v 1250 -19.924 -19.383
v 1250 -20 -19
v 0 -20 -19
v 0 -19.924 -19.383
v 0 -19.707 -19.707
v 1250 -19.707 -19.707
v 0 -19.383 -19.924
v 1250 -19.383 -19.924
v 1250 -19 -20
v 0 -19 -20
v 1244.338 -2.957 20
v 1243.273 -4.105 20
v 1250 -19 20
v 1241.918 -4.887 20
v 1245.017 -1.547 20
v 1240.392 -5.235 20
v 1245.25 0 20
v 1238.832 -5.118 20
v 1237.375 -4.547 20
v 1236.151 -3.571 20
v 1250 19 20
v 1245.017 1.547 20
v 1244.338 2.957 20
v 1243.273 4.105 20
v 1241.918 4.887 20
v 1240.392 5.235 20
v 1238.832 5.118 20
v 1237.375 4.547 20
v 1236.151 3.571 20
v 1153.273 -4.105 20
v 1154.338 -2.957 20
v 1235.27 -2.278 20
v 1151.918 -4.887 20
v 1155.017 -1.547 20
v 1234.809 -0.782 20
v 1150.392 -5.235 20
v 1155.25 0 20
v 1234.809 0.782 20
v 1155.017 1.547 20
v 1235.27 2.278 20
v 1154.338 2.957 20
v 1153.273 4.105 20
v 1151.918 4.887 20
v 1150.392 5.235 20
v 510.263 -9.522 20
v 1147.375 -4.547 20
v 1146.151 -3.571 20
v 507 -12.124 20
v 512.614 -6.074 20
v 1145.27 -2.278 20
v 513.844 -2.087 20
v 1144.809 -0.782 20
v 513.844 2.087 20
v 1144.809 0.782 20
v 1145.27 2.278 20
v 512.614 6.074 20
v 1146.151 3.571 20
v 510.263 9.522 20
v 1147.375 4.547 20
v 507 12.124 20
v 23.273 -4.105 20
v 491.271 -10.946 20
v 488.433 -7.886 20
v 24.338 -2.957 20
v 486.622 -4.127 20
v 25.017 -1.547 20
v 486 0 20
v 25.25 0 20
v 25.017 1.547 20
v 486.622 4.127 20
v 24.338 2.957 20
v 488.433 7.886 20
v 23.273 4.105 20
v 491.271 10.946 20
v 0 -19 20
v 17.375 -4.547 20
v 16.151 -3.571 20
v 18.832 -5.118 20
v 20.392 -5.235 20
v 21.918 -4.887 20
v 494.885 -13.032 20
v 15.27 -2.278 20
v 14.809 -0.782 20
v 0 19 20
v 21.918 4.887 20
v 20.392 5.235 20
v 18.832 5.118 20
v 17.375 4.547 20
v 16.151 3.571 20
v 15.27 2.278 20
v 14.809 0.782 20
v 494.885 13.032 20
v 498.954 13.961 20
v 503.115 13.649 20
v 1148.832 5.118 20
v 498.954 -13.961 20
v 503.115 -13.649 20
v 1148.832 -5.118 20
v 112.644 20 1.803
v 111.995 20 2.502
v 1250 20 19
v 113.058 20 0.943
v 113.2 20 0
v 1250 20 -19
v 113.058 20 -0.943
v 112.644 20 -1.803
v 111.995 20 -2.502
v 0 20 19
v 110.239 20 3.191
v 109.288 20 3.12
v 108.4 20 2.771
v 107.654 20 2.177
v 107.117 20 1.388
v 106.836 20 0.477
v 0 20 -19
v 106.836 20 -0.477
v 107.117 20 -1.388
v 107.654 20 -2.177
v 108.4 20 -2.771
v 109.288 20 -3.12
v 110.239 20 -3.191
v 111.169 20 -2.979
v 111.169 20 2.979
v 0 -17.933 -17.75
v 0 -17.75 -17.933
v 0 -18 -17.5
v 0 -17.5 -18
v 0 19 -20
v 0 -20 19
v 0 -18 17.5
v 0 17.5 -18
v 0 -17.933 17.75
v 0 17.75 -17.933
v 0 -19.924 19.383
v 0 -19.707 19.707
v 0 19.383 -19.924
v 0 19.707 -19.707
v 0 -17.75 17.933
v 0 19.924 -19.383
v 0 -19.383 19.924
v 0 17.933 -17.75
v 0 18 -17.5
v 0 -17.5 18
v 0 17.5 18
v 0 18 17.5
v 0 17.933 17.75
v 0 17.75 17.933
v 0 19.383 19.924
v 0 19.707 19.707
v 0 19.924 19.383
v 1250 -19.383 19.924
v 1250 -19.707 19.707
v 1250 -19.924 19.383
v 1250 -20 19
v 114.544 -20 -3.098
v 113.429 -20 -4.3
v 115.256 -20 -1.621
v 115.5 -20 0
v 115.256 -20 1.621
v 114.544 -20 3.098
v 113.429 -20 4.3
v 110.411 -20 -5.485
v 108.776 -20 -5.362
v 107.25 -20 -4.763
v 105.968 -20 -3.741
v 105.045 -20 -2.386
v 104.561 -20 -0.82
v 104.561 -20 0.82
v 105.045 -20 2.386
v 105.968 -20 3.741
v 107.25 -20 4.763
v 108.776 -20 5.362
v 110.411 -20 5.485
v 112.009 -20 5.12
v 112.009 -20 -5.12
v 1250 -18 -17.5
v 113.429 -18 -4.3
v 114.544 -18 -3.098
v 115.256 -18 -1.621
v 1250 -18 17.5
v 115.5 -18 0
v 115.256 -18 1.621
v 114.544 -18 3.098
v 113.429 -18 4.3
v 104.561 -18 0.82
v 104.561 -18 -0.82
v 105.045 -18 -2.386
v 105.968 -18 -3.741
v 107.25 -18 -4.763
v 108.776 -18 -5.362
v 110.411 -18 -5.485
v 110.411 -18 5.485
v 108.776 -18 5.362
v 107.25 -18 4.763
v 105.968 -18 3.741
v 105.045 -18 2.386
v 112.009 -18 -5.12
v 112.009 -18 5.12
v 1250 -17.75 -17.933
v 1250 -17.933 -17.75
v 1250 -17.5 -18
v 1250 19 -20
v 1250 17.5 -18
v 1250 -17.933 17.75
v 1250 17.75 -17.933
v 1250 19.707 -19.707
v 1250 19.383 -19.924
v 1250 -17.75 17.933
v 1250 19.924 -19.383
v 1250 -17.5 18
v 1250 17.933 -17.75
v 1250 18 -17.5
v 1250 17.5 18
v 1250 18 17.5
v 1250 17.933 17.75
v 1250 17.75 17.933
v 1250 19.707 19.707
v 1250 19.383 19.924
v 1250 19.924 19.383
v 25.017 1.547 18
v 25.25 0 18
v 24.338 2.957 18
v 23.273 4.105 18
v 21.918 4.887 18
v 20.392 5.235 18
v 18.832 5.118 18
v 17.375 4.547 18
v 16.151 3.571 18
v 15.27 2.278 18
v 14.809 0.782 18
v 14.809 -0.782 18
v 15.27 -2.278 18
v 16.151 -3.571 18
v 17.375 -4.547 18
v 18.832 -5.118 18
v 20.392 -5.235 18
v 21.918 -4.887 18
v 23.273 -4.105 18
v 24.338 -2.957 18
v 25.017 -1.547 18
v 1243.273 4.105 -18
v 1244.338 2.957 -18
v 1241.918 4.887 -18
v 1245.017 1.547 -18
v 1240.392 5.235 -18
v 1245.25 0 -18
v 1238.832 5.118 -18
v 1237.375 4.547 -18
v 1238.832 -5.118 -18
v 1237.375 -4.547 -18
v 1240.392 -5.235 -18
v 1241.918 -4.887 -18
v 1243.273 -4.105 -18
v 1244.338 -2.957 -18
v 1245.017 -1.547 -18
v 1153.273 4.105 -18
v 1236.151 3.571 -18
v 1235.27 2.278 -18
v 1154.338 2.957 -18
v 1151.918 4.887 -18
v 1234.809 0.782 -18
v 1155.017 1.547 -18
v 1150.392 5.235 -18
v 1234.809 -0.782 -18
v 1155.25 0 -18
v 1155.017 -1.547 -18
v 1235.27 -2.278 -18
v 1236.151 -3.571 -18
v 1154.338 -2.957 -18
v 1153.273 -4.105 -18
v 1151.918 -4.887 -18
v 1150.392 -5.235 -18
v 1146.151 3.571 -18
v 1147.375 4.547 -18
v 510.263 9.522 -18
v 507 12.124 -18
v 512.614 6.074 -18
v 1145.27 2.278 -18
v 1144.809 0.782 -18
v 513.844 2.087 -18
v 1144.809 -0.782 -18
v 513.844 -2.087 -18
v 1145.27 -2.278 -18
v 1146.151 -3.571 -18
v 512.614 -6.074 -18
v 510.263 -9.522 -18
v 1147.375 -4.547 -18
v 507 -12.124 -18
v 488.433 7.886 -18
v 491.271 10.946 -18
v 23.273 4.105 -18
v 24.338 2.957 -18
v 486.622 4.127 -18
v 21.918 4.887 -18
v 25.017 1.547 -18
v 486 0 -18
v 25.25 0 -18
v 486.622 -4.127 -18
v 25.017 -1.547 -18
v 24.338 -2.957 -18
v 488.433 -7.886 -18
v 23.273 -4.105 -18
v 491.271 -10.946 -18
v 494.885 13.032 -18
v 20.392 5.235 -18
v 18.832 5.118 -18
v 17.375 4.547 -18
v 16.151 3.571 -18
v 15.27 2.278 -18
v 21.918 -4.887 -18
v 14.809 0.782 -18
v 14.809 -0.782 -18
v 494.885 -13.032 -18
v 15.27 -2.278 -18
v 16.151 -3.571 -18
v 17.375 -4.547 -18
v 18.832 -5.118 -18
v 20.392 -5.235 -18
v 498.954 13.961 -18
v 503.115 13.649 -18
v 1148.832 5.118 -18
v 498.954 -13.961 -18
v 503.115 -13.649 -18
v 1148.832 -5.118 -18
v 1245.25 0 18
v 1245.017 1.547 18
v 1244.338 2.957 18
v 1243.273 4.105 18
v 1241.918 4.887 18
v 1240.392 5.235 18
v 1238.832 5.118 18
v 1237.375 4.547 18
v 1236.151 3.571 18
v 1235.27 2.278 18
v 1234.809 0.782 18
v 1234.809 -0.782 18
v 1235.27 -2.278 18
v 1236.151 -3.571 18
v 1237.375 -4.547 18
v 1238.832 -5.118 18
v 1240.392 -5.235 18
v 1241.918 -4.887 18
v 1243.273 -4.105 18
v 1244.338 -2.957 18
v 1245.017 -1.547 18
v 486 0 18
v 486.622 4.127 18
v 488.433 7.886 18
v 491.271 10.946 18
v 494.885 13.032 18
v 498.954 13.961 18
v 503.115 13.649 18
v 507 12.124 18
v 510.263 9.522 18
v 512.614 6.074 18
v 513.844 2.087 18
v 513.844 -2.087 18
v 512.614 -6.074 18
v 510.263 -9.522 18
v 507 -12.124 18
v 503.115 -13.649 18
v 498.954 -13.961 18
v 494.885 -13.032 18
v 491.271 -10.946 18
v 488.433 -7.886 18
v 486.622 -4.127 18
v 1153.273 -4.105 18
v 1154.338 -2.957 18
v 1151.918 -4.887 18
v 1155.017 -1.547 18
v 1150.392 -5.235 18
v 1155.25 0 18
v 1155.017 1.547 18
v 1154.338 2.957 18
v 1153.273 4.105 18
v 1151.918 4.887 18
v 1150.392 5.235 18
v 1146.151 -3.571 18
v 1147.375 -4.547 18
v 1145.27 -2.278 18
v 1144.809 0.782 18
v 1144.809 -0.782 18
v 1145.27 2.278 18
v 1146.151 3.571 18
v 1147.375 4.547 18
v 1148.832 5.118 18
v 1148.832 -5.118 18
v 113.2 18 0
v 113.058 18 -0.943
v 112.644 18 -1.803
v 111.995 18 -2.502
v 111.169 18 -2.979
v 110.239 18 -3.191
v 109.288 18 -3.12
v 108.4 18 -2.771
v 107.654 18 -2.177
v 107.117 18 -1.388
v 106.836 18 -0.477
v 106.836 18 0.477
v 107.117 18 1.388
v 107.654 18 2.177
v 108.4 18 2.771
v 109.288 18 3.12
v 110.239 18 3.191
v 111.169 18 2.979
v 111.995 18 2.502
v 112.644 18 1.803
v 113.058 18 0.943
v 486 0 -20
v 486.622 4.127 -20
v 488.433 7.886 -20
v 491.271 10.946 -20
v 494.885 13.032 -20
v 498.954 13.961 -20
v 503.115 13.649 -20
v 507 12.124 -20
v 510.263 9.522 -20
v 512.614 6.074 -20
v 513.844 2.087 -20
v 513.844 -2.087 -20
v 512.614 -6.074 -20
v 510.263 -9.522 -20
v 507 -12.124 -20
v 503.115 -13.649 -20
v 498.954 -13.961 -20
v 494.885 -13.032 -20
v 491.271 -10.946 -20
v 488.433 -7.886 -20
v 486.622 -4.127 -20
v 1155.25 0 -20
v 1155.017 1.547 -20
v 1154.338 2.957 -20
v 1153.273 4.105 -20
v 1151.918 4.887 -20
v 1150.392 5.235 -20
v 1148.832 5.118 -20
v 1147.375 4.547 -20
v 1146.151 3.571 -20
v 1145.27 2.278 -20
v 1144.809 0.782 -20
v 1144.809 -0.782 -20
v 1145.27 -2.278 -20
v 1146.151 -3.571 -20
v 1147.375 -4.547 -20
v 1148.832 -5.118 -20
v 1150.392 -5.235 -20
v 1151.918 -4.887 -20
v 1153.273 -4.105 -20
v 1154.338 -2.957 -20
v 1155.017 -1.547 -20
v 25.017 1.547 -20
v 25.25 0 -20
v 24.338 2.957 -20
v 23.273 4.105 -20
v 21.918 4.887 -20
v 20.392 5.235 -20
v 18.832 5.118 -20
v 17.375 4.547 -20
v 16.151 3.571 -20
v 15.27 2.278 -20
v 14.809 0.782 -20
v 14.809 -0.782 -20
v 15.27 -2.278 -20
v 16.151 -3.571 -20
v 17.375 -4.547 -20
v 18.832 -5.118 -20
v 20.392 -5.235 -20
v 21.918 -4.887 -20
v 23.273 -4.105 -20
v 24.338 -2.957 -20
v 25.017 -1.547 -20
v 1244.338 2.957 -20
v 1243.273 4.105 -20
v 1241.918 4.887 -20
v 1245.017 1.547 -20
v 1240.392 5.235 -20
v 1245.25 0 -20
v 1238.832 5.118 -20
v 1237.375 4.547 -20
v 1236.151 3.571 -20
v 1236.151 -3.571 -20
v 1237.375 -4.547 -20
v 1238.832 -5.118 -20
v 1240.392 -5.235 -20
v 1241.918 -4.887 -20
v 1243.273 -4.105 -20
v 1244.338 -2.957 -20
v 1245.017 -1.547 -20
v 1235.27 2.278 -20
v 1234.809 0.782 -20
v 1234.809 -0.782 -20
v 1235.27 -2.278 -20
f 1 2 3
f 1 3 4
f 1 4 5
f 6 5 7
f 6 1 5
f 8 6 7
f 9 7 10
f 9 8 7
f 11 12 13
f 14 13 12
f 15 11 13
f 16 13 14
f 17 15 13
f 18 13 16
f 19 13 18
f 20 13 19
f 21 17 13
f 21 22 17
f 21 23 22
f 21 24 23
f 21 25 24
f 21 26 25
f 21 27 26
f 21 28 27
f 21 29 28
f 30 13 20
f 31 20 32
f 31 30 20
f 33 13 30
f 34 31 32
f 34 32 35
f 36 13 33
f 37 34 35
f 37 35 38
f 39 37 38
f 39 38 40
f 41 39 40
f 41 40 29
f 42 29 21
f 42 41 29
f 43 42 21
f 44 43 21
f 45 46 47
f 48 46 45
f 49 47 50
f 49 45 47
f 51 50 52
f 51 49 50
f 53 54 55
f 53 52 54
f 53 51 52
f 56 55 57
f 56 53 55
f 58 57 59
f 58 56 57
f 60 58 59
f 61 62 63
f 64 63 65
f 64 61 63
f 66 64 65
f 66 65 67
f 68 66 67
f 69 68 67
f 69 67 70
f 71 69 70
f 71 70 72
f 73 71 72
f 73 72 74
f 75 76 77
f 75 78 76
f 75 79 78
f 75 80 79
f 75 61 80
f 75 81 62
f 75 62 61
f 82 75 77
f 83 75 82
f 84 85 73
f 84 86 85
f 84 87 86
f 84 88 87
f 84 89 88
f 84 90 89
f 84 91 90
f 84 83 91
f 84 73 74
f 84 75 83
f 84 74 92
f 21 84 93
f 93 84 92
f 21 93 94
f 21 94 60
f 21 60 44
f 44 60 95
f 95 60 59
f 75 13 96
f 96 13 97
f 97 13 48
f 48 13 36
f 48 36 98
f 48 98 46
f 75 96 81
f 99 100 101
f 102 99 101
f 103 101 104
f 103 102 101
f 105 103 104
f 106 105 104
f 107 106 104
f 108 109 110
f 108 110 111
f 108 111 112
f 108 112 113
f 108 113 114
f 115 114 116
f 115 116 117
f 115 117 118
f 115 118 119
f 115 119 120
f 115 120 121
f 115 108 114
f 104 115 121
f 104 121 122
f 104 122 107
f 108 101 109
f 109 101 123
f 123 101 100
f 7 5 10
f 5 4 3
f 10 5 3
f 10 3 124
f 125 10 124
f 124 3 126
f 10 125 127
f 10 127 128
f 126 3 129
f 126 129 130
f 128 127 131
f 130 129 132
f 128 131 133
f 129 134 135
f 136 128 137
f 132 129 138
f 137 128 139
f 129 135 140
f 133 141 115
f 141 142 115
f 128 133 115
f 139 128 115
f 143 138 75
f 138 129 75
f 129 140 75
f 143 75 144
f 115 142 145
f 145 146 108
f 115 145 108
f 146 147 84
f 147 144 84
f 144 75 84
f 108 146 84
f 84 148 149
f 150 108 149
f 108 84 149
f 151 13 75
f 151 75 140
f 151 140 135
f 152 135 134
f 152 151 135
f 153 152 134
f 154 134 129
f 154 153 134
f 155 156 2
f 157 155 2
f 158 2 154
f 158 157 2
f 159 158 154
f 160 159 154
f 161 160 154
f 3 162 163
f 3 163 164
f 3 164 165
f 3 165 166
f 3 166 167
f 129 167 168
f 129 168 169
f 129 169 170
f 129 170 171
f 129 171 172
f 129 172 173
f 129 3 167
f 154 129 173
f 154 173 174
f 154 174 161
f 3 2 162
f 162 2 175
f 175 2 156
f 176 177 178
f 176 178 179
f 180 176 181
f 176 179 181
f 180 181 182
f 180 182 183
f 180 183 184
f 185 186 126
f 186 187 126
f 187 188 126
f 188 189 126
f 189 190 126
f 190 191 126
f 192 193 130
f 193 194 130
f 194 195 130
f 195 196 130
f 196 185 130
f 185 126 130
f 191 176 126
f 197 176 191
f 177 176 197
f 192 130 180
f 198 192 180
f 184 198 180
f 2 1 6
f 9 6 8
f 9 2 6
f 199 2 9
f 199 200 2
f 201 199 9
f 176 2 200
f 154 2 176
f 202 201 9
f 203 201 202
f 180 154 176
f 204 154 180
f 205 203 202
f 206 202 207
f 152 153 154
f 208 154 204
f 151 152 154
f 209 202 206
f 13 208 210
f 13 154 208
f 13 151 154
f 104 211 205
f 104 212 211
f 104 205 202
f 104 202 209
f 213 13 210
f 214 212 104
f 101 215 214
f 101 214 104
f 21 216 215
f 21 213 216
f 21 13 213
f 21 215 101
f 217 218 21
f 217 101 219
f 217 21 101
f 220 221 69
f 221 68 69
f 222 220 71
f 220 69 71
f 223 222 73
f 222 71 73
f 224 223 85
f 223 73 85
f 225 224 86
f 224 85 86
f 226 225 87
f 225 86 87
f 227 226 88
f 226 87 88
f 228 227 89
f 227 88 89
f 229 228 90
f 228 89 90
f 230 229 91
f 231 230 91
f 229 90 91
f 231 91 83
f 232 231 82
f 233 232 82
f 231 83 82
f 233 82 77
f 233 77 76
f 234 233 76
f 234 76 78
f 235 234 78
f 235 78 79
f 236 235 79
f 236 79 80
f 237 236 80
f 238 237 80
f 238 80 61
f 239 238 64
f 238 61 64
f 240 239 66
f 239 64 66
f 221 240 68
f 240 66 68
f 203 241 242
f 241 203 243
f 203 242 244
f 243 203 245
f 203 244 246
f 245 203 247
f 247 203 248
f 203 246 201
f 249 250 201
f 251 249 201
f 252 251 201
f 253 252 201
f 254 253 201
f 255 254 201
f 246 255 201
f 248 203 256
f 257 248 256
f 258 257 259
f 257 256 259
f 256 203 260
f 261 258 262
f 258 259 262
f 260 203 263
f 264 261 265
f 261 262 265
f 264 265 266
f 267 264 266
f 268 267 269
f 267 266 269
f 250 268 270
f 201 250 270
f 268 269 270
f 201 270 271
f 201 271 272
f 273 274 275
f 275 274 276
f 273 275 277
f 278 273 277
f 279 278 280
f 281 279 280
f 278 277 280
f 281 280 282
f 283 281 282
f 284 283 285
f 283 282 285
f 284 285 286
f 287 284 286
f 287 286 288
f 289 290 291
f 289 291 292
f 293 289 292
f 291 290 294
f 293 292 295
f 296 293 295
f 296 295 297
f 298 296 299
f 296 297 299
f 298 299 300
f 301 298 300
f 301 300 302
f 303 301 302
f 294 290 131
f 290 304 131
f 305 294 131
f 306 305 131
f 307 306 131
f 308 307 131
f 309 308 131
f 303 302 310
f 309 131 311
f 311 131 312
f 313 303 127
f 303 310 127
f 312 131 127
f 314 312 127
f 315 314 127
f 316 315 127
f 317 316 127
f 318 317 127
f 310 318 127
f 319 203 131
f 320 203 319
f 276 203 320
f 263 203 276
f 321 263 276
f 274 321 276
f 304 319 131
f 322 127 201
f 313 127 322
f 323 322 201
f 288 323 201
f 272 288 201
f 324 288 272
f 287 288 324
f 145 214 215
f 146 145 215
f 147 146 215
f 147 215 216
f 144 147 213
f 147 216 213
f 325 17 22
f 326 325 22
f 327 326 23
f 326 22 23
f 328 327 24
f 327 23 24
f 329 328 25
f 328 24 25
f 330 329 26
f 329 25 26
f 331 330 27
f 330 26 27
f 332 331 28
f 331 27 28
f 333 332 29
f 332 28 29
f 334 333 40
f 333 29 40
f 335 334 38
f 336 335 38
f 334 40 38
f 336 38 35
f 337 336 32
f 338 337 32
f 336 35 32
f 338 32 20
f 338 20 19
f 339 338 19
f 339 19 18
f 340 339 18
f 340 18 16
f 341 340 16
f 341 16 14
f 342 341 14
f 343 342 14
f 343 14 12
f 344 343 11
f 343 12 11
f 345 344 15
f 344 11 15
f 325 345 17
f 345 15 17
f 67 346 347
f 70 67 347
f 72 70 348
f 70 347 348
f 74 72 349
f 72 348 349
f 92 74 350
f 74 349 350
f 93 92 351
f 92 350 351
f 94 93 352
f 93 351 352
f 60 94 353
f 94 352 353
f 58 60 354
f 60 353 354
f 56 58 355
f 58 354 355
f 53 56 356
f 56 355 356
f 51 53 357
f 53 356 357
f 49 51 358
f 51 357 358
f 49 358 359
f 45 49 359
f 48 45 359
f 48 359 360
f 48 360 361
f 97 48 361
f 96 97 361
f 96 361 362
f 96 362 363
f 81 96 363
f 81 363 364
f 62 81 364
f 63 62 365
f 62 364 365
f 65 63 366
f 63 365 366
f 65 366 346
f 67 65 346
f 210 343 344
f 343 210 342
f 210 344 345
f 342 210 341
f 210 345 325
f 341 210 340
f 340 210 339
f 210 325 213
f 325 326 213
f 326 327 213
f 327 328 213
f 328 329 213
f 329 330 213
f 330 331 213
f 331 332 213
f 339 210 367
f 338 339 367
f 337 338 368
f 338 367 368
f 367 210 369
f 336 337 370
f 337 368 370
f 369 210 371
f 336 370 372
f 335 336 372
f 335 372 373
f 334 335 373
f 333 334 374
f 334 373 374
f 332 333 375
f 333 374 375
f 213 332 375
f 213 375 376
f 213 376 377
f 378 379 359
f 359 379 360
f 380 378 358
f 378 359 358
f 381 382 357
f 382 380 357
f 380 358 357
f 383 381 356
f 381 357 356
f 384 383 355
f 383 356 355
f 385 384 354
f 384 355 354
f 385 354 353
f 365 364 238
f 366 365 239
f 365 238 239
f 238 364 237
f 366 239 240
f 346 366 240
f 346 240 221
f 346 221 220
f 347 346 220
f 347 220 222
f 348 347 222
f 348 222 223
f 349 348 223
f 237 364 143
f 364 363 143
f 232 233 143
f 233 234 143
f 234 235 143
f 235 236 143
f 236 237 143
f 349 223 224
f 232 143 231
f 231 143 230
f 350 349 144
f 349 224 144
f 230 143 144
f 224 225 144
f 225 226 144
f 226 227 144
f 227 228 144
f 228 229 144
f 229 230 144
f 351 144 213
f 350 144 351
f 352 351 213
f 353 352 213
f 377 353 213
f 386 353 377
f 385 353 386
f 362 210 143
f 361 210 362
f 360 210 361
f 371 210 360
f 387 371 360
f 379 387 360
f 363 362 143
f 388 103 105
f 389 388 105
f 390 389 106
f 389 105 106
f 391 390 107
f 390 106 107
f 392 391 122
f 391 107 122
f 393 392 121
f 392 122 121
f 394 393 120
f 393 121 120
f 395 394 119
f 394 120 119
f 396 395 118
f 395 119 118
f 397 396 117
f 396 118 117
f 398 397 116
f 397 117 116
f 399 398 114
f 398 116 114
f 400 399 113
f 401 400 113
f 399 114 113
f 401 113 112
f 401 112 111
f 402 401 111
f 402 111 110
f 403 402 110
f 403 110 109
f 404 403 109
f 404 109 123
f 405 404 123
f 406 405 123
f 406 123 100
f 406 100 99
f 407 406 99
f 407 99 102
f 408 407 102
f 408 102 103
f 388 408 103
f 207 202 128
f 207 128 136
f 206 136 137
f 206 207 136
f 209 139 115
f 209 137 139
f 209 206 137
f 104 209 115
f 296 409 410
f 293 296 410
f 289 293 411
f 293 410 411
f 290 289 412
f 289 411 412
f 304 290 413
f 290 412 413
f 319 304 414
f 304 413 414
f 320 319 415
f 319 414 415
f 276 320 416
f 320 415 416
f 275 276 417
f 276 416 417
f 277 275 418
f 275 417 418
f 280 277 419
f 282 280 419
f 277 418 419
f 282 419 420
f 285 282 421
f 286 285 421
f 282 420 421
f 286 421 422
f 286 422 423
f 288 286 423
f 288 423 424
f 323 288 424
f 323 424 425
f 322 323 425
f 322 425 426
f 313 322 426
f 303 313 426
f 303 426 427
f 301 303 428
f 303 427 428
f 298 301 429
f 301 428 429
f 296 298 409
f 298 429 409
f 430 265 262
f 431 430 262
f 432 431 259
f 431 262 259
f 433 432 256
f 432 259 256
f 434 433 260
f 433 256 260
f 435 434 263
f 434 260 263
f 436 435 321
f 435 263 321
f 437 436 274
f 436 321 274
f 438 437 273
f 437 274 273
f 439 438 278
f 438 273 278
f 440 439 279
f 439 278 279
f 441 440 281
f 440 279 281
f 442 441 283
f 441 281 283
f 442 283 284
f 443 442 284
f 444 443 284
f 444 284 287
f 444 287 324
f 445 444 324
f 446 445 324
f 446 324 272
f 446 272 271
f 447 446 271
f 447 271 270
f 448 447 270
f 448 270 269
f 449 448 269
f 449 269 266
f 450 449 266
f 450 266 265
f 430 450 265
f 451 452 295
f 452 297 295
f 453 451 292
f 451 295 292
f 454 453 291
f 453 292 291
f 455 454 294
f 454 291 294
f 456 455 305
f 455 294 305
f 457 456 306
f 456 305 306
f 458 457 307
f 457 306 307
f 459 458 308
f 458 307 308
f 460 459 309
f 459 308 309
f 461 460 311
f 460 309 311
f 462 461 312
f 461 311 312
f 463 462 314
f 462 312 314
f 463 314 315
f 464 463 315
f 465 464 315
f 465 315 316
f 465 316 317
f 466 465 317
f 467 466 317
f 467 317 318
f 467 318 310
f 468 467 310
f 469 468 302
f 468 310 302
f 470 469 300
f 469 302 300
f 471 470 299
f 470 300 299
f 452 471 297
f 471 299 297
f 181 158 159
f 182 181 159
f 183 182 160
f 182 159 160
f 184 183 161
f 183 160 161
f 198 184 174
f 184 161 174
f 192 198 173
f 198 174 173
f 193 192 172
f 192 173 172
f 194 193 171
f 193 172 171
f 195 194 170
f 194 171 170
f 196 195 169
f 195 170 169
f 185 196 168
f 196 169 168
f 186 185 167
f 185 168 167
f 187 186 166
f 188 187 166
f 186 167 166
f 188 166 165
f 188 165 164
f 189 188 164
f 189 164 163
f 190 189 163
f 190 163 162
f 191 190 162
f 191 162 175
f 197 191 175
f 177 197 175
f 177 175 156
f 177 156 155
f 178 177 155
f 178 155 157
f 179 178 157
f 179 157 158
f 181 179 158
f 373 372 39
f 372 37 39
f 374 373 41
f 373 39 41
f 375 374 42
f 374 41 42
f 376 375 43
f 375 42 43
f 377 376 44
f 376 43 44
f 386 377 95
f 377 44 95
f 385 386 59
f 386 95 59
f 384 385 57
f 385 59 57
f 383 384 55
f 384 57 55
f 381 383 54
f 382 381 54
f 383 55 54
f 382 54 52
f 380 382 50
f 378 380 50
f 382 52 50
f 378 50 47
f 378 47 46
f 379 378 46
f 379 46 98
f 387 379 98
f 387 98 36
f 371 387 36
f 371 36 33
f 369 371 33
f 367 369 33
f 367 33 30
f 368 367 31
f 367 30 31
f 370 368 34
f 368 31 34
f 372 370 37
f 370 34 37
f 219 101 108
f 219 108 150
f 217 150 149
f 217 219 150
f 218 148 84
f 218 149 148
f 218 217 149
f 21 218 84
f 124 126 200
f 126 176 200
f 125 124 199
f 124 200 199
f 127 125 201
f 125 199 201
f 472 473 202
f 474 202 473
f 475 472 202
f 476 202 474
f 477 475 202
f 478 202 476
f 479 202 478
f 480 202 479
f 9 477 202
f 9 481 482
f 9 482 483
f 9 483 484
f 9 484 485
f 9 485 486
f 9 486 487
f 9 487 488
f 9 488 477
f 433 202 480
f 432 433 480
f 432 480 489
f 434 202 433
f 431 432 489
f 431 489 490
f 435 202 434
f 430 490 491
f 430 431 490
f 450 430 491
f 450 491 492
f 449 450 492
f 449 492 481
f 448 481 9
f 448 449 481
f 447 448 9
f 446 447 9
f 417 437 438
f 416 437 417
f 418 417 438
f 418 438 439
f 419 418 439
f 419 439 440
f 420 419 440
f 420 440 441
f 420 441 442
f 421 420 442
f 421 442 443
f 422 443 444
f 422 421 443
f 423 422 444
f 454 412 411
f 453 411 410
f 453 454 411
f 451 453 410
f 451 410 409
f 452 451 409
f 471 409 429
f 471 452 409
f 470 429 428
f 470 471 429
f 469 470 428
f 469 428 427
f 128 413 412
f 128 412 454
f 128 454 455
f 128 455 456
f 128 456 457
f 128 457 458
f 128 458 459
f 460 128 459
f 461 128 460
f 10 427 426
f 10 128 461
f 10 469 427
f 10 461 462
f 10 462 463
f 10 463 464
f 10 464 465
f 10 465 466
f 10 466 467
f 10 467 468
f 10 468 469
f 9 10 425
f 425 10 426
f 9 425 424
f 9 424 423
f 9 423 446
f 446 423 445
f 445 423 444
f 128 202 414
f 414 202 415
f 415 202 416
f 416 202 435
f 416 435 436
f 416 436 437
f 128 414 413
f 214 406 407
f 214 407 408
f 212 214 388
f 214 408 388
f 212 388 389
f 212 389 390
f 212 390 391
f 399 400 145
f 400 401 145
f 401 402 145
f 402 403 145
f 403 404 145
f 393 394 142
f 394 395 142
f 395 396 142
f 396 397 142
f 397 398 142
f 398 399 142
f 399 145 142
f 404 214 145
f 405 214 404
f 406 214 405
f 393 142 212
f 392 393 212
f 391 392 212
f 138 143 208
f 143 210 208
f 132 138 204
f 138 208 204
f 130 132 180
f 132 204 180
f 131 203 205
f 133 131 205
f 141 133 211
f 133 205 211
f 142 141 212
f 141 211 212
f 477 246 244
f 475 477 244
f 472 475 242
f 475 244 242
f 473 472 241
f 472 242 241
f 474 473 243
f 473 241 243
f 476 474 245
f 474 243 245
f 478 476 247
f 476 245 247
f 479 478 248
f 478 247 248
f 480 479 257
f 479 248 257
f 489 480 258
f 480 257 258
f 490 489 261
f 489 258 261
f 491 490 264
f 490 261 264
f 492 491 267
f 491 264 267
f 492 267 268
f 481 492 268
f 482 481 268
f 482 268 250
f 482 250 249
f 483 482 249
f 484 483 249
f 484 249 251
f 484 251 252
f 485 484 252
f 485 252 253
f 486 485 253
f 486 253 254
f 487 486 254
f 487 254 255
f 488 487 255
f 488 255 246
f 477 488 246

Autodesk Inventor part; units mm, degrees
ref_plane "YZ Plane" through (0, 0, 0) normal (1, 0, 0) x (0, 1, 0)
ref_plane "XZ Plane" through (0, 0, 0) normal (0, 1, 0) x (-1, 0, 0)
ref_plane "XY Plane" through (0, 0, 0) normal (0, 0, 1) x (1, 0, 0)
sketch "Skizze1" plane through (0, 0, 0) normal (1, 0, 0) x (0, 1, 0)
  line L0 (-20, 20) -> (20, 20)
  line L1 (20, 20) -> (20, -20)
  line L2 (20, -20) -> (-20, -20)
  line L3 (-20, -20) -> (-20, 20)
  line L4 (-20, 20) -> (20, -20) construction
  line L5 (20, 20) -> (-20, -20) construction
  line L6 (-18, 18) -> (18, 18)
  line L7 (18, 18) -> (18, -18)
  line L8 (18, -18) -> (-18, -18)
  line L9 (-18, -18) -> (-18, 18)
  line L10 (-18, 18) -> (18, -18) construction
  line L11 (18, 18) -> (-18, -18) construction
  point P0 (0, 0)
  dimension "d0" = 40
  dimension "d1" = 40
  dimension "d2" = 36
  dimension "d3" = 36
extrude "Extrusion1" add sketch "Skizze1" along normal blind 1250
sketch "Skizze2" plane through (0, -20, 20) normal (0, 0, 1) x (1, 0, 0)
  circle A0 centre (20, 20) radius 5.25
  line L0 (1250, 2) -> (1250, 38) projected
  circle A1 centre (1150, 20) radius 5.25
  point P0 (0, 20)
  dimension "d7" = 10.5
  dimension "d11" = 10.5
extrude "Extrusion2" cut sketch "Skizze2" against normal blind 1250
sketch "Skizze3" plane through (0, 20, 20) normal (0, 1, 0) x (1, 0, 0)
  line L0 (0, 20) -> (110, 20)
  circle A0 centre (110, 20) radius 3.2
  dimension "d14" = 110
  dimension "d15" = 6.4
extrude "Extrusion3" cut sketch "Skizze3" against normal blind 5
sketch "Skizze4" plane through (0, -20, -20) normal (0, -1, 0) x (1, 0, 0)
  circle A0 centre (110, 20) radius 3.2 projected
  line L0 (0, 20) -> (110, 20)
  circle A1 centre (110, 20) radius 5.5
  dimension "d18" = 110
  dimension "d19" = 11
extrude "Extrusion4" cut sketch "Skizze4" against normal blind 5 contours A0 | A1
fillet "Rundung1" radius 1 4 edges at (625, 20, -20) (625, -20, -20) (625, -20, 20) (625, 20, 20)
fillet "Rundung2" radius 0.5 4 edges at (625, -18, 18) (625, -18, -18) (625, 18, -18) (625, 18, 18)
sketch "Skizze6" plane through (0, -19, -20) normal (0, 0, -1) x (-1, 0, 0)
  line L0 (0, 19) -> (-500, 19)
  circle A0 centre (-500, 19) radius 14
  dimension "d28" = 500
  dimension "d29" = 28
extrude "Extrusion6" cut sketch "Skizze6" against normal blind 40
sketch "Skizze7" plane through (0, -19, 20) normal (0, 0, 1) x (1, 0, 0)
  line L0 (1250, 0) -> (1250, 38) projected
  line L1 (1250, 19) -> (1240, 19)
  circle A0 centre (1240, 19) radius 5.25
  point P0 (0, 19)
  dimension "d32" = 10
  dimension "d33" = 10.5
extrude "Extrusion7" cut sketch "Skizze7" against normal through all
properties part number "Längs_Traverse_hinten" material "Aluminium 6061"
